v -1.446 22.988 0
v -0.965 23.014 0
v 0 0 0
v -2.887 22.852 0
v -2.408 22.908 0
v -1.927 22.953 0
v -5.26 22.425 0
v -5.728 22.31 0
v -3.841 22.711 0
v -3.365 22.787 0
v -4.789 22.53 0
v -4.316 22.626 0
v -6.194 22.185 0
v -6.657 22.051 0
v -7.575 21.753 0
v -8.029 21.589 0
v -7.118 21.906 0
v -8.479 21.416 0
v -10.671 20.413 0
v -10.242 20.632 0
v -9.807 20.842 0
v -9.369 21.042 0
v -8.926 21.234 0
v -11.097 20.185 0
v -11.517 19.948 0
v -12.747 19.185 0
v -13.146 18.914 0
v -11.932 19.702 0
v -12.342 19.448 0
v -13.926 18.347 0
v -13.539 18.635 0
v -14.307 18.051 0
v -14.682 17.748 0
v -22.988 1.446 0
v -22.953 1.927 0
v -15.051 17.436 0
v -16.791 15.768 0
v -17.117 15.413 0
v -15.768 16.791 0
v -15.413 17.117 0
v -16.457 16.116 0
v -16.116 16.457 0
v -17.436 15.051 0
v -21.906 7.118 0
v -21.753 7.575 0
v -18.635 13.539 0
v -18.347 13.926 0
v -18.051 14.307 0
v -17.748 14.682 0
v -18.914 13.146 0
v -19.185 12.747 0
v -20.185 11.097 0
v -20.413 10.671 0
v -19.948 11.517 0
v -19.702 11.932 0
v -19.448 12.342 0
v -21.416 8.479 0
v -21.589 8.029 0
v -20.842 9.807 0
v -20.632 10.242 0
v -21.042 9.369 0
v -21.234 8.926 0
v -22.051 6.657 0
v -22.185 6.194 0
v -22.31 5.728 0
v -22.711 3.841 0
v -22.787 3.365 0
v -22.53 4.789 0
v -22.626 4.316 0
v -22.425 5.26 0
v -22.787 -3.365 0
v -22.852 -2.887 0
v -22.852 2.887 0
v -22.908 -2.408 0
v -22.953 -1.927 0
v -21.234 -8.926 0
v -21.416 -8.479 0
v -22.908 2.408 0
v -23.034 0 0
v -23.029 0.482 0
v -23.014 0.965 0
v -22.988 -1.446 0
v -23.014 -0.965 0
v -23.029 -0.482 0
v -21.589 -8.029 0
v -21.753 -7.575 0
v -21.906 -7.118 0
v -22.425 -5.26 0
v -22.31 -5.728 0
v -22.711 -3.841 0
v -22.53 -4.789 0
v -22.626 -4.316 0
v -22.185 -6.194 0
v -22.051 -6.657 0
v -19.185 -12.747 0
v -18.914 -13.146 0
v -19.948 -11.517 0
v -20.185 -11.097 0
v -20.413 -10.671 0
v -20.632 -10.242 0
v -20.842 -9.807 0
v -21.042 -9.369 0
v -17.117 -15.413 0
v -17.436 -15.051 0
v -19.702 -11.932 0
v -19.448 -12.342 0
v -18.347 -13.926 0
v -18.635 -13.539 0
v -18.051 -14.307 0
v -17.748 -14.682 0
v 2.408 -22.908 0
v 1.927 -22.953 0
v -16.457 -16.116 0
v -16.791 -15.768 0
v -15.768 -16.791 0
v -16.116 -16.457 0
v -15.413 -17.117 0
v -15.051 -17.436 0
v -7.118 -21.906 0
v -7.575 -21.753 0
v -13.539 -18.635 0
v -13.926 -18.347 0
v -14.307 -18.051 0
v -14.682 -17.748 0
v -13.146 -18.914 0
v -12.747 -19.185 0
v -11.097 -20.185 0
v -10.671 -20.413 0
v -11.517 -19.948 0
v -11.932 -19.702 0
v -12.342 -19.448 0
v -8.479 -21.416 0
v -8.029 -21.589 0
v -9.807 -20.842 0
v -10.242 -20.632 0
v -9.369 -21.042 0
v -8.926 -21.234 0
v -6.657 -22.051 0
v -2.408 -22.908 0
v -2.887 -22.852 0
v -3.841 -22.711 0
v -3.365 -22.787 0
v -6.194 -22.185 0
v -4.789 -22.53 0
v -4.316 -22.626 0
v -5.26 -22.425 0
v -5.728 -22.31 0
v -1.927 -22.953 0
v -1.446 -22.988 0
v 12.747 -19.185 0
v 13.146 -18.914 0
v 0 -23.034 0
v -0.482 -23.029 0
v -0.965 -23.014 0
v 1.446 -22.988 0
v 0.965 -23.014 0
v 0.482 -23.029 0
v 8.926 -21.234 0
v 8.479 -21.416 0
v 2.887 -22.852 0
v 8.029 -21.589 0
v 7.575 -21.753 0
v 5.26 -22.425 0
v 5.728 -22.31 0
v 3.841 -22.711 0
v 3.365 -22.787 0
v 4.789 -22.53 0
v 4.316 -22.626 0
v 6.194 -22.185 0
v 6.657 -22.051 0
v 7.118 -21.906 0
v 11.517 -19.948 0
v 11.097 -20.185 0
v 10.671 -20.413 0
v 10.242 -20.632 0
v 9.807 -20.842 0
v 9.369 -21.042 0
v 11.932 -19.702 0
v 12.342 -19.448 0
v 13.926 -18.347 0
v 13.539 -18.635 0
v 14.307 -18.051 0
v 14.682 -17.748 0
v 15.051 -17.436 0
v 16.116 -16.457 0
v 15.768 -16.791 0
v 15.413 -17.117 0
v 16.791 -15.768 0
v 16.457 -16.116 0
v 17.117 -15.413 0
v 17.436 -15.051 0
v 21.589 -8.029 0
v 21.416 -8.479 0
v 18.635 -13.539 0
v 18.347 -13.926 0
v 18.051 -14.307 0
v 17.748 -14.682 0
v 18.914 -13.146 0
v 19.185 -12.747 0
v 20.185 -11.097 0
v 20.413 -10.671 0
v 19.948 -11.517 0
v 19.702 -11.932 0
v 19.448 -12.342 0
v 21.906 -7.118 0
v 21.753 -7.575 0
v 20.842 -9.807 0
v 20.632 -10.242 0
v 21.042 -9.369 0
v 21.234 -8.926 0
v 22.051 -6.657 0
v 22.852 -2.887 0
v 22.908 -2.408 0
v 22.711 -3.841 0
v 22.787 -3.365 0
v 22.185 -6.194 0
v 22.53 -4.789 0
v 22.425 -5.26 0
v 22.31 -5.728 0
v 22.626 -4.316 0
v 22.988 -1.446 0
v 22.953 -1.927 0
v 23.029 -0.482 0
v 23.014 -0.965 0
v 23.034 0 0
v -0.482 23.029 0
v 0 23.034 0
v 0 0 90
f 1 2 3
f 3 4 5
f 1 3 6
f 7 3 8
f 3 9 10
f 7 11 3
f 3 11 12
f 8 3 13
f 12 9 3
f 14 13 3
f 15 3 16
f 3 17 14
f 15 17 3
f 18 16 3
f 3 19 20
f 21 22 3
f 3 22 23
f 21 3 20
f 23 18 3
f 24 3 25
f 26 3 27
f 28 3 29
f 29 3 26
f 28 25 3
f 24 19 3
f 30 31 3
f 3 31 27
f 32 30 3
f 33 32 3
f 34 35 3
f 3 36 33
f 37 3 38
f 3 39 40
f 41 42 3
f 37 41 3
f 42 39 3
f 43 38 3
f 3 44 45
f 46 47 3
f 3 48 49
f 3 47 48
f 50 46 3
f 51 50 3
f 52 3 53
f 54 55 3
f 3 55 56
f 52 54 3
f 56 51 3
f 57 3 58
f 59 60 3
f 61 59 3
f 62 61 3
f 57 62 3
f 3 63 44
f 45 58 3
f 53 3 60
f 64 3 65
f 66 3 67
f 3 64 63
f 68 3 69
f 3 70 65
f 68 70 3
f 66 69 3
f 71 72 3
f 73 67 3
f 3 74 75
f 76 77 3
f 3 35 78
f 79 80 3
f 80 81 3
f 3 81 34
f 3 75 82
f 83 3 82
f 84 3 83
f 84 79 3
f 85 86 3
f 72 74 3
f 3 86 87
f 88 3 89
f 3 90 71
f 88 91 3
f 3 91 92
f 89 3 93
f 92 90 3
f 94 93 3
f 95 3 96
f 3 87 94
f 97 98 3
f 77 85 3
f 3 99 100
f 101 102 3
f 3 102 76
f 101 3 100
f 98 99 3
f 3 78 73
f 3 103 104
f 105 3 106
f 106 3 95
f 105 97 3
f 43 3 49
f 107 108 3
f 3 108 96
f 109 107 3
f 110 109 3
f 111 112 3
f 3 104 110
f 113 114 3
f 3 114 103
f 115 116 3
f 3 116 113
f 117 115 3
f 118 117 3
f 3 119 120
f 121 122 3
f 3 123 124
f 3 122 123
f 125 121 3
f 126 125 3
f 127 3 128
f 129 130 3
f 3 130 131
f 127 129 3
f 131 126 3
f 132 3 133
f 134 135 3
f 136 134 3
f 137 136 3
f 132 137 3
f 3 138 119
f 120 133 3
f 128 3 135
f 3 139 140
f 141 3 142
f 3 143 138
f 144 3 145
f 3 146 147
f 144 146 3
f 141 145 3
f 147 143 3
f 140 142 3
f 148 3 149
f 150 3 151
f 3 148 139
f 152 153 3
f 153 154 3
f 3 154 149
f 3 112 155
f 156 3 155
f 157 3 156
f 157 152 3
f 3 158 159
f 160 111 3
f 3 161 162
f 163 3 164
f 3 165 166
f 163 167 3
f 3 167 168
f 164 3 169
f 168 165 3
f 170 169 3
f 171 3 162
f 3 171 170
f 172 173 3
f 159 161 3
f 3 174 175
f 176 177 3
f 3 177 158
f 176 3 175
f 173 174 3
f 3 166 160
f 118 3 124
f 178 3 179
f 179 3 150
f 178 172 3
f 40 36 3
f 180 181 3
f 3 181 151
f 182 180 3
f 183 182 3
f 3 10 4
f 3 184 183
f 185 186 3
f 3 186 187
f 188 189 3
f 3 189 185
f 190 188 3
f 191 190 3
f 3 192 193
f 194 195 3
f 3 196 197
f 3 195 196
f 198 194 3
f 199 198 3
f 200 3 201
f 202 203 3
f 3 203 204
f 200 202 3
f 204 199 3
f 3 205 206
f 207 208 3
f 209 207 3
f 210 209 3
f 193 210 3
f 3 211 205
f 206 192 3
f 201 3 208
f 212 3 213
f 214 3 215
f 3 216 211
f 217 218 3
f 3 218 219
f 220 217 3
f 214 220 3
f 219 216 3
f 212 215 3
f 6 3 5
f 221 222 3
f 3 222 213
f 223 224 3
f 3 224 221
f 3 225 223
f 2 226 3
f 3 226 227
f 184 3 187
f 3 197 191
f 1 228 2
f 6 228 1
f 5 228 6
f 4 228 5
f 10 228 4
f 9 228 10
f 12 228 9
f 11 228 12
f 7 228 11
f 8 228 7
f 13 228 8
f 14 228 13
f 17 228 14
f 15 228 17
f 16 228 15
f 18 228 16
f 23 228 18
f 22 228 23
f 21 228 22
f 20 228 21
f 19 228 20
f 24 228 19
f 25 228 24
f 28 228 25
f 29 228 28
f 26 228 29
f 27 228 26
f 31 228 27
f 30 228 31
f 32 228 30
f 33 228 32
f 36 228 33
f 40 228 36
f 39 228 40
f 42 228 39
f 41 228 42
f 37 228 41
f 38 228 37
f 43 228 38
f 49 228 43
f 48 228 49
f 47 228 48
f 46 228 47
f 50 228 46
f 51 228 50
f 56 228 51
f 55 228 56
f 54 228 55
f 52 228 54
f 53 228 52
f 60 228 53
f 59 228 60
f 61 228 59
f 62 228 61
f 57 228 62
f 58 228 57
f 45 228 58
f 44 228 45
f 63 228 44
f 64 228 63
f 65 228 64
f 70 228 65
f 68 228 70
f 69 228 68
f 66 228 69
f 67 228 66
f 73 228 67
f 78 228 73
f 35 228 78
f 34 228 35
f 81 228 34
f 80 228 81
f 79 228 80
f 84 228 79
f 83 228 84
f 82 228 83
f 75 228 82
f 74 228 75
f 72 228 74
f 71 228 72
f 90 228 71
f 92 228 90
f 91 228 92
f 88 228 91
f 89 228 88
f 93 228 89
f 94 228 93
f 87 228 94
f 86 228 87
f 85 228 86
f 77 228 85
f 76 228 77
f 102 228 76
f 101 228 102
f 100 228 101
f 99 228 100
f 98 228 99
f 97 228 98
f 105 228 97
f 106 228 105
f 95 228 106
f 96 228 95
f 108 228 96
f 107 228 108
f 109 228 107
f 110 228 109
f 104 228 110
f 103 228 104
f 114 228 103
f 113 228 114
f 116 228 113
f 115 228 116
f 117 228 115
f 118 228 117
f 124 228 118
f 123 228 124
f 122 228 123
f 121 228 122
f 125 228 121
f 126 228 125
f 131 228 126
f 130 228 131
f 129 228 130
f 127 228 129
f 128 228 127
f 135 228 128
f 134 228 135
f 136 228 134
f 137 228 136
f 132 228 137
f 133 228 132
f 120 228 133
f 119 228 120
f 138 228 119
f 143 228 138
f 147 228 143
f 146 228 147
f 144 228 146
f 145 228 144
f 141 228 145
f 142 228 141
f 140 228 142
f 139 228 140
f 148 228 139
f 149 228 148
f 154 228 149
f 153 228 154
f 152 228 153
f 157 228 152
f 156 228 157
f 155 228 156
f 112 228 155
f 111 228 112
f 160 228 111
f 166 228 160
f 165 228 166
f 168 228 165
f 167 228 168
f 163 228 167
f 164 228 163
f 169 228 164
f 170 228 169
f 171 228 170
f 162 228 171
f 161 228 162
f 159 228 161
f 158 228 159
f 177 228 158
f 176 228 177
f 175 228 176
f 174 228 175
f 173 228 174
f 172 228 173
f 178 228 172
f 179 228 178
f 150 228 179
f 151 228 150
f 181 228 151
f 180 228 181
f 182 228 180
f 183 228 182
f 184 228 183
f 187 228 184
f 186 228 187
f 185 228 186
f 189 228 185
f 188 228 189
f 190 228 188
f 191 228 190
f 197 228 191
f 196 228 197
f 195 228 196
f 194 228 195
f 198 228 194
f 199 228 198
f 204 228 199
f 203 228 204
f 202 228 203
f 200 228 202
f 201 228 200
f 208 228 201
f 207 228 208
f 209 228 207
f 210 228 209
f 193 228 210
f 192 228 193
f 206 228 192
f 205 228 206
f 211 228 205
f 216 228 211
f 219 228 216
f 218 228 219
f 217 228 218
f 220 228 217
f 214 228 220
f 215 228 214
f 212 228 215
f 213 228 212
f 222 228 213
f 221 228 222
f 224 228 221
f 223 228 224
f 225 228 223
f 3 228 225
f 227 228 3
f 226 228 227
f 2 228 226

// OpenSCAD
// enter these three variables:

v = 50000; // volume in cubic mm (cc * 1000)
h = 90; // height in mm
n = 300; // number of sides (not including bottom)

wall = 1;
tol = .2;
lid = true;
lip = .25;
ball = 6;
offset = [0, 0];

// STL files don't have curves, so a cone must be approximated by using a large number for n. Depending on size, you'll want to find a value for area that results in a side length (check the console output) around 0.2-0.5mm. Sides shorter than this will not look smoother noticeably smoother once printed.

// the rest is calculated...

a = v / h * 3; // base-sectional area
s = 2 * sqrt(a * tan(180 / n) / n);
apothem = (2 * a / n / s);
r = apothem / cos(180 / n);

cylinders = 0;


	if(cylinders) for(i = [0:cylinders - 1]) translate([offset[0] * (1 - i / cylinders), offset[1] * (1 - i / cylinders), i * h / cylinders]) cylinder(r = r * (cylinders - i) / cylinders, h = h / cylinders, $fn = n);
	else linear_extrude(h, scale = 0) translate(offset) difference(){
		circle(r, $fn = n);
		square(r);
	}
	
	echo(str("base-sectional area: ", a)); // base-sectional area
	echo(str("side: ", s)); // side
	echo(str("radius: ", r)); // radius
	if((n % 2)) echo(str("radius + apothem: ", r + apothem)); // radius + apothem (only calculated for an odd number of sides)
	echo(str("apothem: ", apothem)); // apothem
	echo(str("circumscribed circle area: ", PI * pow(r, 2))); // circumscribed circle area
	echo(str("inscribed circle area: ", PI * pow(apothem, 2))); // inscribed circle area
	echo(str("polygon area: ", .5 * n * s * r * cos(180 / n))); // polygon area
